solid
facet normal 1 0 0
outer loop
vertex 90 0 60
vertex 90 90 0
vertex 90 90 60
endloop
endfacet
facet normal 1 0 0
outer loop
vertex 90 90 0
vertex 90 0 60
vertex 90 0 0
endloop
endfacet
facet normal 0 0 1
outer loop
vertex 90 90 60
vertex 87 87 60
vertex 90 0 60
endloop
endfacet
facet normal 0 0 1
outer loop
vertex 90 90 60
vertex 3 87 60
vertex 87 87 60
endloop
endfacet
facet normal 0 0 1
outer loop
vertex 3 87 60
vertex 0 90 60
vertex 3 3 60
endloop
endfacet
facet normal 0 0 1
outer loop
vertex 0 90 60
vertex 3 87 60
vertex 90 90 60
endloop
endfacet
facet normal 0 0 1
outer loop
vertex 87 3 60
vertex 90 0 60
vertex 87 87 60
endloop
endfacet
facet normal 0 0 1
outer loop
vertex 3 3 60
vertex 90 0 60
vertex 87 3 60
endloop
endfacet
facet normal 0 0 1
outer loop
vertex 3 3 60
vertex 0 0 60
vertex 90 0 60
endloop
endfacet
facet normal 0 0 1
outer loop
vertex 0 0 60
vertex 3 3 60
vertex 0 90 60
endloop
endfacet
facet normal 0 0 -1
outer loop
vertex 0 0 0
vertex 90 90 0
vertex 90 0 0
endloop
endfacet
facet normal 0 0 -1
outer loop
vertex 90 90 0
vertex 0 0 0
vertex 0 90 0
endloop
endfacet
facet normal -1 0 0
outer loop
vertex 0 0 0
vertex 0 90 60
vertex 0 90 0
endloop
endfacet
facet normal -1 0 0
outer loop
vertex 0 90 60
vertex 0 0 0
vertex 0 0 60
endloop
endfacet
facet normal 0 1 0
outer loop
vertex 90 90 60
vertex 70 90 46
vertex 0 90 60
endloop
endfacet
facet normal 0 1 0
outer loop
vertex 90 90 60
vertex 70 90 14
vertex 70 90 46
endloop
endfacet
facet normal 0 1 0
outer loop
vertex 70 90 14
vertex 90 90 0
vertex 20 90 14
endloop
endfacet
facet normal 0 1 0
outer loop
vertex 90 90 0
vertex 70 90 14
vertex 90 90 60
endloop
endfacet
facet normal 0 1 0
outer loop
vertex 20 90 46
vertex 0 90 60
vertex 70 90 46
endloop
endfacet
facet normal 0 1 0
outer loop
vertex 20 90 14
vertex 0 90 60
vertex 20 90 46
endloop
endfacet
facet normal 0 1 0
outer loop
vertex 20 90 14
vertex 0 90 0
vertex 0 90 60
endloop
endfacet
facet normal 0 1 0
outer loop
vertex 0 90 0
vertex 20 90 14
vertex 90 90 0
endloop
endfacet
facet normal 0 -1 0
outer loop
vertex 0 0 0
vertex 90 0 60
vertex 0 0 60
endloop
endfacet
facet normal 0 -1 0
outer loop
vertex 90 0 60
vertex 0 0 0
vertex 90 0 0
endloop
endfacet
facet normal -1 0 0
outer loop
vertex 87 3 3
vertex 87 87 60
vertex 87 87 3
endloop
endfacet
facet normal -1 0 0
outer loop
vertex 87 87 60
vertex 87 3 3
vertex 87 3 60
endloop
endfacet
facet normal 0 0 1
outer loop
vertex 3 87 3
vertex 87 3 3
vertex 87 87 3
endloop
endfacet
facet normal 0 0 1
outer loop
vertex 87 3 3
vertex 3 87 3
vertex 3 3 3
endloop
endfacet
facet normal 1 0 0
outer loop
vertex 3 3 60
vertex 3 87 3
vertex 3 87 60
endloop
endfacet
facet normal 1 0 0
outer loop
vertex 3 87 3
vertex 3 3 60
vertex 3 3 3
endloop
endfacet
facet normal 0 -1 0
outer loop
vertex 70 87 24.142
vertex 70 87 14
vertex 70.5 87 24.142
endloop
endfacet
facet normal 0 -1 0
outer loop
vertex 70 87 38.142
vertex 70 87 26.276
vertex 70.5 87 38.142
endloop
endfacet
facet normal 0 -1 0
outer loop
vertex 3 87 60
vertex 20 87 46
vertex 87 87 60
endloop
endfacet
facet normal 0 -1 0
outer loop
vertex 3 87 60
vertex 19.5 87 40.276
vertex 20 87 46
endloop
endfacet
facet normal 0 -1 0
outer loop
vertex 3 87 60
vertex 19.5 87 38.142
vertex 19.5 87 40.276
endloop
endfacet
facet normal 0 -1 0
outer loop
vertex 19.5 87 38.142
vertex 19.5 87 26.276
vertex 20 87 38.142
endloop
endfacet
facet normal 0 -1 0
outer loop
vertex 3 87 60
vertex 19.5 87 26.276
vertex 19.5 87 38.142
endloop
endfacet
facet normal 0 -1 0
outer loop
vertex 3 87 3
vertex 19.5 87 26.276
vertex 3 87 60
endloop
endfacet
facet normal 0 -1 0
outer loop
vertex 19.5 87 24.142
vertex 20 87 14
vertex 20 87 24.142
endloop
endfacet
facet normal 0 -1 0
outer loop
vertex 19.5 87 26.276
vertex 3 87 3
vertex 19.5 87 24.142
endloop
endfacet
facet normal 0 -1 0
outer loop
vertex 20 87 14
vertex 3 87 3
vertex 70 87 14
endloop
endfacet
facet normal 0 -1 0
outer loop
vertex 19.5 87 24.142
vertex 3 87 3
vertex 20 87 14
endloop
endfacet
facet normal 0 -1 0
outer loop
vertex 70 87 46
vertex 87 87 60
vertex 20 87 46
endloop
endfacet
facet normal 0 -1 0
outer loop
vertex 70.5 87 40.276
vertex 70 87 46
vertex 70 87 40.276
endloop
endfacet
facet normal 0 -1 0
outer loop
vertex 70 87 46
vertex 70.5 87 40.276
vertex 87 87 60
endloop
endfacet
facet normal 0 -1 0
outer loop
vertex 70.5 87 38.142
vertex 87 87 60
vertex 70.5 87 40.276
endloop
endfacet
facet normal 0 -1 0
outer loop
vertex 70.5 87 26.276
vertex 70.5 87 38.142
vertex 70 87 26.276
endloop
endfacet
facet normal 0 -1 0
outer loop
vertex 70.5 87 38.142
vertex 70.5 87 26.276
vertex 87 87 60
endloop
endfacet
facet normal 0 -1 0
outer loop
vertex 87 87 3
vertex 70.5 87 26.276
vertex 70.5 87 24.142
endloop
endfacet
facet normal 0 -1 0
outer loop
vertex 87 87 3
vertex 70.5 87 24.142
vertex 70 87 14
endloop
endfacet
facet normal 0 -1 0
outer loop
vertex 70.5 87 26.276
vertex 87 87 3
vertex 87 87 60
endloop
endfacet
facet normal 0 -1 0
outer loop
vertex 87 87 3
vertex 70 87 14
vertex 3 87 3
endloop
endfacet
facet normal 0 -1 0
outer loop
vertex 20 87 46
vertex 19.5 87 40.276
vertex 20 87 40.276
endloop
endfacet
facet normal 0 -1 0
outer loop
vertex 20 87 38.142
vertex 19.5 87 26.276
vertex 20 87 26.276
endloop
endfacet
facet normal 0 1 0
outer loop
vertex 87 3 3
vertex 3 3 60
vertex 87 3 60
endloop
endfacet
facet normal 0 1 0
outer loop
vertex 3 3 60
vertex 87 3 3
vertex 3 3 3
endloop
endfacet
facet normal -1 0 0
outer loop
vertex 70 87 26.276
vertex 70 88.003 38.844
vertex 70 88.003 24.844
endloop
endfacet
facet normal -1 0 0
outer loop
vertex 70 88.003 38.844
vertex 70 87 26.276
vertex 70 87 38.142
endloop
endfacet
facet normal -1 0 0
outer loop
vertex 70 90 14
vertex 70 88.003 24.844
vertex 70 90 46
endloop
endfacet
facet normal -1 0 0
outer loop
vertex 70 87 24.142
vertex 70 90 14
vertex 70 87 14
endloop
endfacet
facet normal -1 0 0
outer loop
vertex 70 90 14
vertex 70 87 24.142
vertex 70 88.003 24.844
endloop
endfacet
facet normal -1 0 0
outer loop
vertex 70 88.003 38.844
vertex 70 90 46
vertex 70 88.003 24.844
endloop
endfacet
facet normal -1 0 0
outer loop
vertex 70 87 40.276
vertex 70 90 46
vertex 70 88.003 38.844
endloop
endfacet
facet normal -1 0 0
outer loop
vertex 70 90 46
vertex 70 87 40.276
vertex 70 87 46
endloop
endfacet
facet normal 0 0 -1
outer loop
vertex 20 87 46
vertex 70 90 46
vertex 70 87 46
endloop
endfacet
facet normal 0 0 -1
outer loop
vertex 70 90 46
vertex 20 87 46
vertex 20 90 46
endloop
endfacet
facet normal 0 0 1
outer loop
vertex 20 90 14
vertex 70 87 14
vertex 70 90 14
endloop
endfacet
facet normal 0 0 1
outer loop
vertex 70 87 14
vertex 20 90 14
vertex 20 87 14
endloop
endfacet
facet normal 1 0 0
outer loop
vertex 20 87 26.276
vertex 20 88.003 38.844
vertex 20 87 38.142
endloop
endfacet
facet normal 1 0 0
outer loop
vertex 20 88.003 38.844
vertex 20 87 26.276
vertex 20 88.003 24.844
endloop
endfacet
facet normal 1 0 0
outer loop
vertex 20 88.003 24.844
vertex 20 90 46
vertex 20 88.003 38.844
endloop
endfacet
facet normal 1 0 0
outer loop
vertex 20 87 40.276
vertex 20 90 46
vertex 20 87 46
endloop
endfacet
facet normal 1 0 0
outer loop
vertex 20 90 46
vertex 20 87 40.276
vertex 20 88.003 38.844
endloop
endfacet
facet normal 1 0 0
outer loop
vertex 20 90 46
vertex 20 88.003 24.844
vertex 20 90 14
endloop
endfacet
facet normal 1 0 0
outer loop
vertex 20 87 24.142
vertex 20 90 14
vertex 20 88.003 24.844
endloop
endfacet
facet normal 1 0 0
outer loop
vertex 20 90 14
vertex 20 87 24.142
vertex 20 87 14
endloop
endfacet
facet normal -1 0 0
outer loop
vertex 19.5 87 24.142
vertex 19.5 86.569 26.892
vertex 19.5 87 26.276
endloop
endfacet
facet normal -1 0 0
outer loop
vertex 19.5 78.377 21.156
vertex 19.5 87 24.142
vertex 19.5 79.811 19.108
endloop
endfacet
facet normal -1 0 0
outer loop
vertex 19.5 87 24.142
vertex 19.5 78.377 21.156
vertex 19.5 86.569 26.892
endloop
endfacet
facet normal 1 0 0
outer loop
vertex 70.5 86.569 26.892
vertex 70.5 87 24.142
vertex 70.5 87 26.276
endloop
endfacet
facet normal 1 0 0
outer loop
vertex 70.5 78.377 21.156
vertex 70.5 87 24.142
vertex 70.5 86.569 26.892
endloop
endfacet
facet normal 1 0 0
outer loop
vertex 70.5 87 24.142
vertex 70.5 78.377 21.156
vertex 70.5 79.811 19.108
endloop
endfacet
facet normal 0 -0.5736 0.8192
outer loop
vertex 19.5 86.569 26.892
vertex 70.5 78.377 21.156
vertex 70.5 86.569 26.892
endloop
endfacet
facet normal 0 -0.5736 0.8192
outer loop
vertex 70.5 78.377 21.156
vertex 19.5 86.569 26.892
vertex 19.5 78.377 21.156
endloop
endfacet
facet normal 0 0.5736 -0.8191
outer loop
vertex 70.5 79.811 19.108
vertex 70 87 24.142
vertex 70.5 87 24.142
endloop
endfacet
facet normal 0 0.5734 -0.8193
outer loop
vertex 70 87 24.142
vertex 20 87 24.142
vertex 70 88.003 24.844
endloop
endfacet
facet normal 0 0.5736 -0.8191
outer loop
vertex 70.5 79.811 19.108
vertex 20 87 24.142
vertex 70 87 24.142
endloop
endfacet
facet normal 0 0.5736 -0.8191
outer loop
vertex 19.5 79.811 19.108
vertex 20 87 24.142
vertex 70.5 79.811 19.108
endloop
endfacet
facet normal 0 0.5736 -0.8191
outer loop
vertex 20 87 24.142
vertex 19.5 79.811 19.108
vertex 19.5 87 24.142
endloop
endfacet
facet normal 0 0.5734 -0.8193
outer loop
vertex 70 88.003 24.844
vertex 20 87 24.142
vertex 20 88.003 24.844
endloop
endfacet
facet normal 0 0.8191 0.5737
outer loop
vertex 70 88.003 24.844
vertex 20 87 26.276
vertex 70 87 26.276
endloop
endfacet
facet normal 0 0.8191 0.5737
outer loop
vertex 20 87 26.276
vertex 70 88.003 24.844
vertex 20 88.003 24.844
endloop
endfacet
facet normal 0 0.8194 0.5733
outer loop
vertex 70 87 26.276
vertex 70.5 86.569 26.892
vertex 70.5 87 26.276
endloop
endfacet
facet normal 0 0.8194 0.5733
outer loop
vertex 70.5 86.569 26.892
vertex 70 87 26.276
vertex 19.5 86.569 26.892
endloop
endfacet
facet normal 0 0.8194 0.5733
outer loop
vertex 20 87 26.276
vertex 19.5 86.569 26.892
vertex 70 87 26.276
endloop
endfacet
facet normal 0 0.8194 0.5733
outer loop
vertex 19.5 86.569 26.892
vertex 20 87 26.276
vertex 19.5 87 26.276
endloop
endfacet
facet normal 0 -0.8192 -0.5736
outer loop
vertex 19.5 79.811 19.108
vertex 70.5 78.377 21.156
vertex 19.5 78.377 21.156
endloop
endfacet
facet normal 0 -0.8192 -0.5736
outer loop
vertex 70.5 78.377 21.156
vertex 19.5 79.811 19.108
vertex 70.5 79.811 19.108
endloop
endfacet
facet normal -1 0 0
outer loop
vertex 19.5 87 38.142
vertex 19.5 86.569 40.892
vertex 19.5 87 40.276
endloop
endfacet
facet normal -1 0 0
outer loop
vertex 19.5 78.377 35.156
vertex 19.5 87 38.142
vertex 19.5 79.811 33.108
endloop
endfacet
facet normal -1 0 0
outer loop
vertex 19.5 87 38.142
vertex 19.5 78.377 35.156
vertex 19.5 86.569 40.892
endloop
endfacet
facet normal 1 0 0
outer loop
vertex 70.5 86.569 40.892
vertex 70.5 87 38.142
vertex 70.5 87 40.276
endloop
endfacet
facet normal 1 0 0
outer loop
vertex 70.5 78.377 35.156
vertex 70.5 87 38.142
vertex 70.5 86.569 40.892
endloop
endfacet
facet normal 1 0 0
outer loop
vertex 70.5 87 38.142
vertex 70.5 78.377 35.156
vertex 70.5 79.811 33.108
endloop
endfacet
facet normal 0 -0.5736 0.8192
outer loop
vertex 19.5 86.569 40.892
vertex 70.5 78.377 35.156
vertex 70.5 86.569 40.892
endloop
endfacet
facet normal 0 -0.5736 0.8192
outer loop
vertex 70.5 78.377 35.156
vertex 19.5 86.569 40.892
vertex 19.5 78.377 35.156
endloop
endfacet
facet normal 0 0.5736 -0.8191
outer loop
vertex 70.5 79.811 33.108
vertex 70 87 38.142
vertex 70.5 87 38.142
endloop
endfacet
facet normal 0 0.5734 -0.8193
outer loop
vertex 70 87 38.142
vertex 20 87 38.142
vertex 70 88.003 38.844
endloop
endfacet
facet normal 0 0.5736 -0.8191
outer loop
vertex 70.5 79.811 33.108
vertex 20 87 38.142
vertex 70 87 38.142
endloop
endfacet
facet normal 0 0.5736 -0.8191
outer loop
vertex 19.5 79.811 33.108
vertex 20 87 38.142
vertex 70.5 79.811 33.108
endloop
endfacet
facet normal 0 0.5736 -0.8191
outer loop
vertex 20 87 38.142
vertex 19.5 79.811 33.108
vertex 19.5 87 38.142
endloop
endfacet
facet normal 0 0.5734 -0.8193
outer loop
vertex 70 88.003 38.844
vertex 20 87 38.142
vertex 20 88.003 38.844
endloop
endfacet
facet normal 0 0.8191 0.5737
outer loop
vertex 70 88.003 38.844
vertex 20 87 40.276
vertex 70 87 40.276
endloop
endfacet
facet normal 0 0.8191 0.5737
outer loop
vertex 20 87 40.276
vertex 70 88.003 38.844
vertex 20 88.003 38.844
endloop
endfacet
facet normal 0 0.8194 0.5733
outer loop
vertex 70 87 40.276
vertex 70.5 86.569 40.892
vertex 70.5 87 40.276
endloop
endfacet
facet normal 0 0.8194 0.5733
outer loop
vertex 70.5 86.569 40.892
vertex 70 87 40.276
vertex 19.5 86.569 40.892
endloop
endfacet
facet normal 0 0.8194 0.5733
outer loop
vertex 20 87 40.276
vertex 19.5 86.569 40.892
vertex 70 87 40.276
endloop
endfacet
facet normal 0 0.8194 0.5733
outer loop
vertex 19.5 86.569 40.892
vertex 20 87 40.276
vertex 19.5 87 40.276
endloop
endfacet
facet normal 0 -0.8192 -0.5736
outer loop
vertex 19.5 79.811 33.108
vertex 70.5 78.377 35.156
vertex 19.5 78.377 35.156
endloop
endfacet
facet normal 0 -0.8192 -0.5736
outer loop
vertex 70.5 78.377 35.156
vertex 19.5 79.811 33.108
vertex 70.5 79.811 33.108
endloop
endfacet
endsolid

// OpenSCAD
$fn = 32;

// ----------------------------------------------------------------------
// Vent box: louvers enclosure
// ----------------------------------------------------------------------

// --- parameters (mm) ---
box_l = 90;               // box length, X
box_w = 90;               // box width, Y
box_h = 60;               // box height, Z
wall_t = 3;               // shell wall thickness
win_l = 50;               // vent window width, X
win_h = 32;               // vent window height, Z
slat_t = 2.5;             // louver slat thickness
slat_d = 10;              // louver slat depth
slat_a = 35;              // louver slat angle, degrees
slat_pitch = 14;          // louver pitch
slat_yc = 83.19;          // slat centreline Y
fit_tol = 0.05;           // tolerance for press fits, mm
free_tol = 0.3;           // tolerance for clearance fits, mm

win_z0 = (box_h - win_h) / 2;  // window lower edge Z
n_slats = 2;  // louver count
slat_z0 = win_z0 + (win_h - (n_slats - 1) * slat_pitch) / 2;

difference() {
  union() {
    difference() {
      cube([box_l, box_w, box_h]);
  translate([wall_t, wall_t, wall_t])
    cube([box_l - 2 * wall_t, box_w - 2 * wall_t, box_h]);
  translate([(box_l - win_l) / 2, box_w - wall_t - 1, win_z0])
    cube([win_l, wall_t + 2, win_h]);
    }
    for (i = [0 : n_slats - 1])
      translate([box_l / 2, slat_yc, slat_z0 + i * slat_pitch])
        rotate([slat_a, 0, 0])
          cube([win_l + 1, slat_d, slat_t], center = true);
  }
}
